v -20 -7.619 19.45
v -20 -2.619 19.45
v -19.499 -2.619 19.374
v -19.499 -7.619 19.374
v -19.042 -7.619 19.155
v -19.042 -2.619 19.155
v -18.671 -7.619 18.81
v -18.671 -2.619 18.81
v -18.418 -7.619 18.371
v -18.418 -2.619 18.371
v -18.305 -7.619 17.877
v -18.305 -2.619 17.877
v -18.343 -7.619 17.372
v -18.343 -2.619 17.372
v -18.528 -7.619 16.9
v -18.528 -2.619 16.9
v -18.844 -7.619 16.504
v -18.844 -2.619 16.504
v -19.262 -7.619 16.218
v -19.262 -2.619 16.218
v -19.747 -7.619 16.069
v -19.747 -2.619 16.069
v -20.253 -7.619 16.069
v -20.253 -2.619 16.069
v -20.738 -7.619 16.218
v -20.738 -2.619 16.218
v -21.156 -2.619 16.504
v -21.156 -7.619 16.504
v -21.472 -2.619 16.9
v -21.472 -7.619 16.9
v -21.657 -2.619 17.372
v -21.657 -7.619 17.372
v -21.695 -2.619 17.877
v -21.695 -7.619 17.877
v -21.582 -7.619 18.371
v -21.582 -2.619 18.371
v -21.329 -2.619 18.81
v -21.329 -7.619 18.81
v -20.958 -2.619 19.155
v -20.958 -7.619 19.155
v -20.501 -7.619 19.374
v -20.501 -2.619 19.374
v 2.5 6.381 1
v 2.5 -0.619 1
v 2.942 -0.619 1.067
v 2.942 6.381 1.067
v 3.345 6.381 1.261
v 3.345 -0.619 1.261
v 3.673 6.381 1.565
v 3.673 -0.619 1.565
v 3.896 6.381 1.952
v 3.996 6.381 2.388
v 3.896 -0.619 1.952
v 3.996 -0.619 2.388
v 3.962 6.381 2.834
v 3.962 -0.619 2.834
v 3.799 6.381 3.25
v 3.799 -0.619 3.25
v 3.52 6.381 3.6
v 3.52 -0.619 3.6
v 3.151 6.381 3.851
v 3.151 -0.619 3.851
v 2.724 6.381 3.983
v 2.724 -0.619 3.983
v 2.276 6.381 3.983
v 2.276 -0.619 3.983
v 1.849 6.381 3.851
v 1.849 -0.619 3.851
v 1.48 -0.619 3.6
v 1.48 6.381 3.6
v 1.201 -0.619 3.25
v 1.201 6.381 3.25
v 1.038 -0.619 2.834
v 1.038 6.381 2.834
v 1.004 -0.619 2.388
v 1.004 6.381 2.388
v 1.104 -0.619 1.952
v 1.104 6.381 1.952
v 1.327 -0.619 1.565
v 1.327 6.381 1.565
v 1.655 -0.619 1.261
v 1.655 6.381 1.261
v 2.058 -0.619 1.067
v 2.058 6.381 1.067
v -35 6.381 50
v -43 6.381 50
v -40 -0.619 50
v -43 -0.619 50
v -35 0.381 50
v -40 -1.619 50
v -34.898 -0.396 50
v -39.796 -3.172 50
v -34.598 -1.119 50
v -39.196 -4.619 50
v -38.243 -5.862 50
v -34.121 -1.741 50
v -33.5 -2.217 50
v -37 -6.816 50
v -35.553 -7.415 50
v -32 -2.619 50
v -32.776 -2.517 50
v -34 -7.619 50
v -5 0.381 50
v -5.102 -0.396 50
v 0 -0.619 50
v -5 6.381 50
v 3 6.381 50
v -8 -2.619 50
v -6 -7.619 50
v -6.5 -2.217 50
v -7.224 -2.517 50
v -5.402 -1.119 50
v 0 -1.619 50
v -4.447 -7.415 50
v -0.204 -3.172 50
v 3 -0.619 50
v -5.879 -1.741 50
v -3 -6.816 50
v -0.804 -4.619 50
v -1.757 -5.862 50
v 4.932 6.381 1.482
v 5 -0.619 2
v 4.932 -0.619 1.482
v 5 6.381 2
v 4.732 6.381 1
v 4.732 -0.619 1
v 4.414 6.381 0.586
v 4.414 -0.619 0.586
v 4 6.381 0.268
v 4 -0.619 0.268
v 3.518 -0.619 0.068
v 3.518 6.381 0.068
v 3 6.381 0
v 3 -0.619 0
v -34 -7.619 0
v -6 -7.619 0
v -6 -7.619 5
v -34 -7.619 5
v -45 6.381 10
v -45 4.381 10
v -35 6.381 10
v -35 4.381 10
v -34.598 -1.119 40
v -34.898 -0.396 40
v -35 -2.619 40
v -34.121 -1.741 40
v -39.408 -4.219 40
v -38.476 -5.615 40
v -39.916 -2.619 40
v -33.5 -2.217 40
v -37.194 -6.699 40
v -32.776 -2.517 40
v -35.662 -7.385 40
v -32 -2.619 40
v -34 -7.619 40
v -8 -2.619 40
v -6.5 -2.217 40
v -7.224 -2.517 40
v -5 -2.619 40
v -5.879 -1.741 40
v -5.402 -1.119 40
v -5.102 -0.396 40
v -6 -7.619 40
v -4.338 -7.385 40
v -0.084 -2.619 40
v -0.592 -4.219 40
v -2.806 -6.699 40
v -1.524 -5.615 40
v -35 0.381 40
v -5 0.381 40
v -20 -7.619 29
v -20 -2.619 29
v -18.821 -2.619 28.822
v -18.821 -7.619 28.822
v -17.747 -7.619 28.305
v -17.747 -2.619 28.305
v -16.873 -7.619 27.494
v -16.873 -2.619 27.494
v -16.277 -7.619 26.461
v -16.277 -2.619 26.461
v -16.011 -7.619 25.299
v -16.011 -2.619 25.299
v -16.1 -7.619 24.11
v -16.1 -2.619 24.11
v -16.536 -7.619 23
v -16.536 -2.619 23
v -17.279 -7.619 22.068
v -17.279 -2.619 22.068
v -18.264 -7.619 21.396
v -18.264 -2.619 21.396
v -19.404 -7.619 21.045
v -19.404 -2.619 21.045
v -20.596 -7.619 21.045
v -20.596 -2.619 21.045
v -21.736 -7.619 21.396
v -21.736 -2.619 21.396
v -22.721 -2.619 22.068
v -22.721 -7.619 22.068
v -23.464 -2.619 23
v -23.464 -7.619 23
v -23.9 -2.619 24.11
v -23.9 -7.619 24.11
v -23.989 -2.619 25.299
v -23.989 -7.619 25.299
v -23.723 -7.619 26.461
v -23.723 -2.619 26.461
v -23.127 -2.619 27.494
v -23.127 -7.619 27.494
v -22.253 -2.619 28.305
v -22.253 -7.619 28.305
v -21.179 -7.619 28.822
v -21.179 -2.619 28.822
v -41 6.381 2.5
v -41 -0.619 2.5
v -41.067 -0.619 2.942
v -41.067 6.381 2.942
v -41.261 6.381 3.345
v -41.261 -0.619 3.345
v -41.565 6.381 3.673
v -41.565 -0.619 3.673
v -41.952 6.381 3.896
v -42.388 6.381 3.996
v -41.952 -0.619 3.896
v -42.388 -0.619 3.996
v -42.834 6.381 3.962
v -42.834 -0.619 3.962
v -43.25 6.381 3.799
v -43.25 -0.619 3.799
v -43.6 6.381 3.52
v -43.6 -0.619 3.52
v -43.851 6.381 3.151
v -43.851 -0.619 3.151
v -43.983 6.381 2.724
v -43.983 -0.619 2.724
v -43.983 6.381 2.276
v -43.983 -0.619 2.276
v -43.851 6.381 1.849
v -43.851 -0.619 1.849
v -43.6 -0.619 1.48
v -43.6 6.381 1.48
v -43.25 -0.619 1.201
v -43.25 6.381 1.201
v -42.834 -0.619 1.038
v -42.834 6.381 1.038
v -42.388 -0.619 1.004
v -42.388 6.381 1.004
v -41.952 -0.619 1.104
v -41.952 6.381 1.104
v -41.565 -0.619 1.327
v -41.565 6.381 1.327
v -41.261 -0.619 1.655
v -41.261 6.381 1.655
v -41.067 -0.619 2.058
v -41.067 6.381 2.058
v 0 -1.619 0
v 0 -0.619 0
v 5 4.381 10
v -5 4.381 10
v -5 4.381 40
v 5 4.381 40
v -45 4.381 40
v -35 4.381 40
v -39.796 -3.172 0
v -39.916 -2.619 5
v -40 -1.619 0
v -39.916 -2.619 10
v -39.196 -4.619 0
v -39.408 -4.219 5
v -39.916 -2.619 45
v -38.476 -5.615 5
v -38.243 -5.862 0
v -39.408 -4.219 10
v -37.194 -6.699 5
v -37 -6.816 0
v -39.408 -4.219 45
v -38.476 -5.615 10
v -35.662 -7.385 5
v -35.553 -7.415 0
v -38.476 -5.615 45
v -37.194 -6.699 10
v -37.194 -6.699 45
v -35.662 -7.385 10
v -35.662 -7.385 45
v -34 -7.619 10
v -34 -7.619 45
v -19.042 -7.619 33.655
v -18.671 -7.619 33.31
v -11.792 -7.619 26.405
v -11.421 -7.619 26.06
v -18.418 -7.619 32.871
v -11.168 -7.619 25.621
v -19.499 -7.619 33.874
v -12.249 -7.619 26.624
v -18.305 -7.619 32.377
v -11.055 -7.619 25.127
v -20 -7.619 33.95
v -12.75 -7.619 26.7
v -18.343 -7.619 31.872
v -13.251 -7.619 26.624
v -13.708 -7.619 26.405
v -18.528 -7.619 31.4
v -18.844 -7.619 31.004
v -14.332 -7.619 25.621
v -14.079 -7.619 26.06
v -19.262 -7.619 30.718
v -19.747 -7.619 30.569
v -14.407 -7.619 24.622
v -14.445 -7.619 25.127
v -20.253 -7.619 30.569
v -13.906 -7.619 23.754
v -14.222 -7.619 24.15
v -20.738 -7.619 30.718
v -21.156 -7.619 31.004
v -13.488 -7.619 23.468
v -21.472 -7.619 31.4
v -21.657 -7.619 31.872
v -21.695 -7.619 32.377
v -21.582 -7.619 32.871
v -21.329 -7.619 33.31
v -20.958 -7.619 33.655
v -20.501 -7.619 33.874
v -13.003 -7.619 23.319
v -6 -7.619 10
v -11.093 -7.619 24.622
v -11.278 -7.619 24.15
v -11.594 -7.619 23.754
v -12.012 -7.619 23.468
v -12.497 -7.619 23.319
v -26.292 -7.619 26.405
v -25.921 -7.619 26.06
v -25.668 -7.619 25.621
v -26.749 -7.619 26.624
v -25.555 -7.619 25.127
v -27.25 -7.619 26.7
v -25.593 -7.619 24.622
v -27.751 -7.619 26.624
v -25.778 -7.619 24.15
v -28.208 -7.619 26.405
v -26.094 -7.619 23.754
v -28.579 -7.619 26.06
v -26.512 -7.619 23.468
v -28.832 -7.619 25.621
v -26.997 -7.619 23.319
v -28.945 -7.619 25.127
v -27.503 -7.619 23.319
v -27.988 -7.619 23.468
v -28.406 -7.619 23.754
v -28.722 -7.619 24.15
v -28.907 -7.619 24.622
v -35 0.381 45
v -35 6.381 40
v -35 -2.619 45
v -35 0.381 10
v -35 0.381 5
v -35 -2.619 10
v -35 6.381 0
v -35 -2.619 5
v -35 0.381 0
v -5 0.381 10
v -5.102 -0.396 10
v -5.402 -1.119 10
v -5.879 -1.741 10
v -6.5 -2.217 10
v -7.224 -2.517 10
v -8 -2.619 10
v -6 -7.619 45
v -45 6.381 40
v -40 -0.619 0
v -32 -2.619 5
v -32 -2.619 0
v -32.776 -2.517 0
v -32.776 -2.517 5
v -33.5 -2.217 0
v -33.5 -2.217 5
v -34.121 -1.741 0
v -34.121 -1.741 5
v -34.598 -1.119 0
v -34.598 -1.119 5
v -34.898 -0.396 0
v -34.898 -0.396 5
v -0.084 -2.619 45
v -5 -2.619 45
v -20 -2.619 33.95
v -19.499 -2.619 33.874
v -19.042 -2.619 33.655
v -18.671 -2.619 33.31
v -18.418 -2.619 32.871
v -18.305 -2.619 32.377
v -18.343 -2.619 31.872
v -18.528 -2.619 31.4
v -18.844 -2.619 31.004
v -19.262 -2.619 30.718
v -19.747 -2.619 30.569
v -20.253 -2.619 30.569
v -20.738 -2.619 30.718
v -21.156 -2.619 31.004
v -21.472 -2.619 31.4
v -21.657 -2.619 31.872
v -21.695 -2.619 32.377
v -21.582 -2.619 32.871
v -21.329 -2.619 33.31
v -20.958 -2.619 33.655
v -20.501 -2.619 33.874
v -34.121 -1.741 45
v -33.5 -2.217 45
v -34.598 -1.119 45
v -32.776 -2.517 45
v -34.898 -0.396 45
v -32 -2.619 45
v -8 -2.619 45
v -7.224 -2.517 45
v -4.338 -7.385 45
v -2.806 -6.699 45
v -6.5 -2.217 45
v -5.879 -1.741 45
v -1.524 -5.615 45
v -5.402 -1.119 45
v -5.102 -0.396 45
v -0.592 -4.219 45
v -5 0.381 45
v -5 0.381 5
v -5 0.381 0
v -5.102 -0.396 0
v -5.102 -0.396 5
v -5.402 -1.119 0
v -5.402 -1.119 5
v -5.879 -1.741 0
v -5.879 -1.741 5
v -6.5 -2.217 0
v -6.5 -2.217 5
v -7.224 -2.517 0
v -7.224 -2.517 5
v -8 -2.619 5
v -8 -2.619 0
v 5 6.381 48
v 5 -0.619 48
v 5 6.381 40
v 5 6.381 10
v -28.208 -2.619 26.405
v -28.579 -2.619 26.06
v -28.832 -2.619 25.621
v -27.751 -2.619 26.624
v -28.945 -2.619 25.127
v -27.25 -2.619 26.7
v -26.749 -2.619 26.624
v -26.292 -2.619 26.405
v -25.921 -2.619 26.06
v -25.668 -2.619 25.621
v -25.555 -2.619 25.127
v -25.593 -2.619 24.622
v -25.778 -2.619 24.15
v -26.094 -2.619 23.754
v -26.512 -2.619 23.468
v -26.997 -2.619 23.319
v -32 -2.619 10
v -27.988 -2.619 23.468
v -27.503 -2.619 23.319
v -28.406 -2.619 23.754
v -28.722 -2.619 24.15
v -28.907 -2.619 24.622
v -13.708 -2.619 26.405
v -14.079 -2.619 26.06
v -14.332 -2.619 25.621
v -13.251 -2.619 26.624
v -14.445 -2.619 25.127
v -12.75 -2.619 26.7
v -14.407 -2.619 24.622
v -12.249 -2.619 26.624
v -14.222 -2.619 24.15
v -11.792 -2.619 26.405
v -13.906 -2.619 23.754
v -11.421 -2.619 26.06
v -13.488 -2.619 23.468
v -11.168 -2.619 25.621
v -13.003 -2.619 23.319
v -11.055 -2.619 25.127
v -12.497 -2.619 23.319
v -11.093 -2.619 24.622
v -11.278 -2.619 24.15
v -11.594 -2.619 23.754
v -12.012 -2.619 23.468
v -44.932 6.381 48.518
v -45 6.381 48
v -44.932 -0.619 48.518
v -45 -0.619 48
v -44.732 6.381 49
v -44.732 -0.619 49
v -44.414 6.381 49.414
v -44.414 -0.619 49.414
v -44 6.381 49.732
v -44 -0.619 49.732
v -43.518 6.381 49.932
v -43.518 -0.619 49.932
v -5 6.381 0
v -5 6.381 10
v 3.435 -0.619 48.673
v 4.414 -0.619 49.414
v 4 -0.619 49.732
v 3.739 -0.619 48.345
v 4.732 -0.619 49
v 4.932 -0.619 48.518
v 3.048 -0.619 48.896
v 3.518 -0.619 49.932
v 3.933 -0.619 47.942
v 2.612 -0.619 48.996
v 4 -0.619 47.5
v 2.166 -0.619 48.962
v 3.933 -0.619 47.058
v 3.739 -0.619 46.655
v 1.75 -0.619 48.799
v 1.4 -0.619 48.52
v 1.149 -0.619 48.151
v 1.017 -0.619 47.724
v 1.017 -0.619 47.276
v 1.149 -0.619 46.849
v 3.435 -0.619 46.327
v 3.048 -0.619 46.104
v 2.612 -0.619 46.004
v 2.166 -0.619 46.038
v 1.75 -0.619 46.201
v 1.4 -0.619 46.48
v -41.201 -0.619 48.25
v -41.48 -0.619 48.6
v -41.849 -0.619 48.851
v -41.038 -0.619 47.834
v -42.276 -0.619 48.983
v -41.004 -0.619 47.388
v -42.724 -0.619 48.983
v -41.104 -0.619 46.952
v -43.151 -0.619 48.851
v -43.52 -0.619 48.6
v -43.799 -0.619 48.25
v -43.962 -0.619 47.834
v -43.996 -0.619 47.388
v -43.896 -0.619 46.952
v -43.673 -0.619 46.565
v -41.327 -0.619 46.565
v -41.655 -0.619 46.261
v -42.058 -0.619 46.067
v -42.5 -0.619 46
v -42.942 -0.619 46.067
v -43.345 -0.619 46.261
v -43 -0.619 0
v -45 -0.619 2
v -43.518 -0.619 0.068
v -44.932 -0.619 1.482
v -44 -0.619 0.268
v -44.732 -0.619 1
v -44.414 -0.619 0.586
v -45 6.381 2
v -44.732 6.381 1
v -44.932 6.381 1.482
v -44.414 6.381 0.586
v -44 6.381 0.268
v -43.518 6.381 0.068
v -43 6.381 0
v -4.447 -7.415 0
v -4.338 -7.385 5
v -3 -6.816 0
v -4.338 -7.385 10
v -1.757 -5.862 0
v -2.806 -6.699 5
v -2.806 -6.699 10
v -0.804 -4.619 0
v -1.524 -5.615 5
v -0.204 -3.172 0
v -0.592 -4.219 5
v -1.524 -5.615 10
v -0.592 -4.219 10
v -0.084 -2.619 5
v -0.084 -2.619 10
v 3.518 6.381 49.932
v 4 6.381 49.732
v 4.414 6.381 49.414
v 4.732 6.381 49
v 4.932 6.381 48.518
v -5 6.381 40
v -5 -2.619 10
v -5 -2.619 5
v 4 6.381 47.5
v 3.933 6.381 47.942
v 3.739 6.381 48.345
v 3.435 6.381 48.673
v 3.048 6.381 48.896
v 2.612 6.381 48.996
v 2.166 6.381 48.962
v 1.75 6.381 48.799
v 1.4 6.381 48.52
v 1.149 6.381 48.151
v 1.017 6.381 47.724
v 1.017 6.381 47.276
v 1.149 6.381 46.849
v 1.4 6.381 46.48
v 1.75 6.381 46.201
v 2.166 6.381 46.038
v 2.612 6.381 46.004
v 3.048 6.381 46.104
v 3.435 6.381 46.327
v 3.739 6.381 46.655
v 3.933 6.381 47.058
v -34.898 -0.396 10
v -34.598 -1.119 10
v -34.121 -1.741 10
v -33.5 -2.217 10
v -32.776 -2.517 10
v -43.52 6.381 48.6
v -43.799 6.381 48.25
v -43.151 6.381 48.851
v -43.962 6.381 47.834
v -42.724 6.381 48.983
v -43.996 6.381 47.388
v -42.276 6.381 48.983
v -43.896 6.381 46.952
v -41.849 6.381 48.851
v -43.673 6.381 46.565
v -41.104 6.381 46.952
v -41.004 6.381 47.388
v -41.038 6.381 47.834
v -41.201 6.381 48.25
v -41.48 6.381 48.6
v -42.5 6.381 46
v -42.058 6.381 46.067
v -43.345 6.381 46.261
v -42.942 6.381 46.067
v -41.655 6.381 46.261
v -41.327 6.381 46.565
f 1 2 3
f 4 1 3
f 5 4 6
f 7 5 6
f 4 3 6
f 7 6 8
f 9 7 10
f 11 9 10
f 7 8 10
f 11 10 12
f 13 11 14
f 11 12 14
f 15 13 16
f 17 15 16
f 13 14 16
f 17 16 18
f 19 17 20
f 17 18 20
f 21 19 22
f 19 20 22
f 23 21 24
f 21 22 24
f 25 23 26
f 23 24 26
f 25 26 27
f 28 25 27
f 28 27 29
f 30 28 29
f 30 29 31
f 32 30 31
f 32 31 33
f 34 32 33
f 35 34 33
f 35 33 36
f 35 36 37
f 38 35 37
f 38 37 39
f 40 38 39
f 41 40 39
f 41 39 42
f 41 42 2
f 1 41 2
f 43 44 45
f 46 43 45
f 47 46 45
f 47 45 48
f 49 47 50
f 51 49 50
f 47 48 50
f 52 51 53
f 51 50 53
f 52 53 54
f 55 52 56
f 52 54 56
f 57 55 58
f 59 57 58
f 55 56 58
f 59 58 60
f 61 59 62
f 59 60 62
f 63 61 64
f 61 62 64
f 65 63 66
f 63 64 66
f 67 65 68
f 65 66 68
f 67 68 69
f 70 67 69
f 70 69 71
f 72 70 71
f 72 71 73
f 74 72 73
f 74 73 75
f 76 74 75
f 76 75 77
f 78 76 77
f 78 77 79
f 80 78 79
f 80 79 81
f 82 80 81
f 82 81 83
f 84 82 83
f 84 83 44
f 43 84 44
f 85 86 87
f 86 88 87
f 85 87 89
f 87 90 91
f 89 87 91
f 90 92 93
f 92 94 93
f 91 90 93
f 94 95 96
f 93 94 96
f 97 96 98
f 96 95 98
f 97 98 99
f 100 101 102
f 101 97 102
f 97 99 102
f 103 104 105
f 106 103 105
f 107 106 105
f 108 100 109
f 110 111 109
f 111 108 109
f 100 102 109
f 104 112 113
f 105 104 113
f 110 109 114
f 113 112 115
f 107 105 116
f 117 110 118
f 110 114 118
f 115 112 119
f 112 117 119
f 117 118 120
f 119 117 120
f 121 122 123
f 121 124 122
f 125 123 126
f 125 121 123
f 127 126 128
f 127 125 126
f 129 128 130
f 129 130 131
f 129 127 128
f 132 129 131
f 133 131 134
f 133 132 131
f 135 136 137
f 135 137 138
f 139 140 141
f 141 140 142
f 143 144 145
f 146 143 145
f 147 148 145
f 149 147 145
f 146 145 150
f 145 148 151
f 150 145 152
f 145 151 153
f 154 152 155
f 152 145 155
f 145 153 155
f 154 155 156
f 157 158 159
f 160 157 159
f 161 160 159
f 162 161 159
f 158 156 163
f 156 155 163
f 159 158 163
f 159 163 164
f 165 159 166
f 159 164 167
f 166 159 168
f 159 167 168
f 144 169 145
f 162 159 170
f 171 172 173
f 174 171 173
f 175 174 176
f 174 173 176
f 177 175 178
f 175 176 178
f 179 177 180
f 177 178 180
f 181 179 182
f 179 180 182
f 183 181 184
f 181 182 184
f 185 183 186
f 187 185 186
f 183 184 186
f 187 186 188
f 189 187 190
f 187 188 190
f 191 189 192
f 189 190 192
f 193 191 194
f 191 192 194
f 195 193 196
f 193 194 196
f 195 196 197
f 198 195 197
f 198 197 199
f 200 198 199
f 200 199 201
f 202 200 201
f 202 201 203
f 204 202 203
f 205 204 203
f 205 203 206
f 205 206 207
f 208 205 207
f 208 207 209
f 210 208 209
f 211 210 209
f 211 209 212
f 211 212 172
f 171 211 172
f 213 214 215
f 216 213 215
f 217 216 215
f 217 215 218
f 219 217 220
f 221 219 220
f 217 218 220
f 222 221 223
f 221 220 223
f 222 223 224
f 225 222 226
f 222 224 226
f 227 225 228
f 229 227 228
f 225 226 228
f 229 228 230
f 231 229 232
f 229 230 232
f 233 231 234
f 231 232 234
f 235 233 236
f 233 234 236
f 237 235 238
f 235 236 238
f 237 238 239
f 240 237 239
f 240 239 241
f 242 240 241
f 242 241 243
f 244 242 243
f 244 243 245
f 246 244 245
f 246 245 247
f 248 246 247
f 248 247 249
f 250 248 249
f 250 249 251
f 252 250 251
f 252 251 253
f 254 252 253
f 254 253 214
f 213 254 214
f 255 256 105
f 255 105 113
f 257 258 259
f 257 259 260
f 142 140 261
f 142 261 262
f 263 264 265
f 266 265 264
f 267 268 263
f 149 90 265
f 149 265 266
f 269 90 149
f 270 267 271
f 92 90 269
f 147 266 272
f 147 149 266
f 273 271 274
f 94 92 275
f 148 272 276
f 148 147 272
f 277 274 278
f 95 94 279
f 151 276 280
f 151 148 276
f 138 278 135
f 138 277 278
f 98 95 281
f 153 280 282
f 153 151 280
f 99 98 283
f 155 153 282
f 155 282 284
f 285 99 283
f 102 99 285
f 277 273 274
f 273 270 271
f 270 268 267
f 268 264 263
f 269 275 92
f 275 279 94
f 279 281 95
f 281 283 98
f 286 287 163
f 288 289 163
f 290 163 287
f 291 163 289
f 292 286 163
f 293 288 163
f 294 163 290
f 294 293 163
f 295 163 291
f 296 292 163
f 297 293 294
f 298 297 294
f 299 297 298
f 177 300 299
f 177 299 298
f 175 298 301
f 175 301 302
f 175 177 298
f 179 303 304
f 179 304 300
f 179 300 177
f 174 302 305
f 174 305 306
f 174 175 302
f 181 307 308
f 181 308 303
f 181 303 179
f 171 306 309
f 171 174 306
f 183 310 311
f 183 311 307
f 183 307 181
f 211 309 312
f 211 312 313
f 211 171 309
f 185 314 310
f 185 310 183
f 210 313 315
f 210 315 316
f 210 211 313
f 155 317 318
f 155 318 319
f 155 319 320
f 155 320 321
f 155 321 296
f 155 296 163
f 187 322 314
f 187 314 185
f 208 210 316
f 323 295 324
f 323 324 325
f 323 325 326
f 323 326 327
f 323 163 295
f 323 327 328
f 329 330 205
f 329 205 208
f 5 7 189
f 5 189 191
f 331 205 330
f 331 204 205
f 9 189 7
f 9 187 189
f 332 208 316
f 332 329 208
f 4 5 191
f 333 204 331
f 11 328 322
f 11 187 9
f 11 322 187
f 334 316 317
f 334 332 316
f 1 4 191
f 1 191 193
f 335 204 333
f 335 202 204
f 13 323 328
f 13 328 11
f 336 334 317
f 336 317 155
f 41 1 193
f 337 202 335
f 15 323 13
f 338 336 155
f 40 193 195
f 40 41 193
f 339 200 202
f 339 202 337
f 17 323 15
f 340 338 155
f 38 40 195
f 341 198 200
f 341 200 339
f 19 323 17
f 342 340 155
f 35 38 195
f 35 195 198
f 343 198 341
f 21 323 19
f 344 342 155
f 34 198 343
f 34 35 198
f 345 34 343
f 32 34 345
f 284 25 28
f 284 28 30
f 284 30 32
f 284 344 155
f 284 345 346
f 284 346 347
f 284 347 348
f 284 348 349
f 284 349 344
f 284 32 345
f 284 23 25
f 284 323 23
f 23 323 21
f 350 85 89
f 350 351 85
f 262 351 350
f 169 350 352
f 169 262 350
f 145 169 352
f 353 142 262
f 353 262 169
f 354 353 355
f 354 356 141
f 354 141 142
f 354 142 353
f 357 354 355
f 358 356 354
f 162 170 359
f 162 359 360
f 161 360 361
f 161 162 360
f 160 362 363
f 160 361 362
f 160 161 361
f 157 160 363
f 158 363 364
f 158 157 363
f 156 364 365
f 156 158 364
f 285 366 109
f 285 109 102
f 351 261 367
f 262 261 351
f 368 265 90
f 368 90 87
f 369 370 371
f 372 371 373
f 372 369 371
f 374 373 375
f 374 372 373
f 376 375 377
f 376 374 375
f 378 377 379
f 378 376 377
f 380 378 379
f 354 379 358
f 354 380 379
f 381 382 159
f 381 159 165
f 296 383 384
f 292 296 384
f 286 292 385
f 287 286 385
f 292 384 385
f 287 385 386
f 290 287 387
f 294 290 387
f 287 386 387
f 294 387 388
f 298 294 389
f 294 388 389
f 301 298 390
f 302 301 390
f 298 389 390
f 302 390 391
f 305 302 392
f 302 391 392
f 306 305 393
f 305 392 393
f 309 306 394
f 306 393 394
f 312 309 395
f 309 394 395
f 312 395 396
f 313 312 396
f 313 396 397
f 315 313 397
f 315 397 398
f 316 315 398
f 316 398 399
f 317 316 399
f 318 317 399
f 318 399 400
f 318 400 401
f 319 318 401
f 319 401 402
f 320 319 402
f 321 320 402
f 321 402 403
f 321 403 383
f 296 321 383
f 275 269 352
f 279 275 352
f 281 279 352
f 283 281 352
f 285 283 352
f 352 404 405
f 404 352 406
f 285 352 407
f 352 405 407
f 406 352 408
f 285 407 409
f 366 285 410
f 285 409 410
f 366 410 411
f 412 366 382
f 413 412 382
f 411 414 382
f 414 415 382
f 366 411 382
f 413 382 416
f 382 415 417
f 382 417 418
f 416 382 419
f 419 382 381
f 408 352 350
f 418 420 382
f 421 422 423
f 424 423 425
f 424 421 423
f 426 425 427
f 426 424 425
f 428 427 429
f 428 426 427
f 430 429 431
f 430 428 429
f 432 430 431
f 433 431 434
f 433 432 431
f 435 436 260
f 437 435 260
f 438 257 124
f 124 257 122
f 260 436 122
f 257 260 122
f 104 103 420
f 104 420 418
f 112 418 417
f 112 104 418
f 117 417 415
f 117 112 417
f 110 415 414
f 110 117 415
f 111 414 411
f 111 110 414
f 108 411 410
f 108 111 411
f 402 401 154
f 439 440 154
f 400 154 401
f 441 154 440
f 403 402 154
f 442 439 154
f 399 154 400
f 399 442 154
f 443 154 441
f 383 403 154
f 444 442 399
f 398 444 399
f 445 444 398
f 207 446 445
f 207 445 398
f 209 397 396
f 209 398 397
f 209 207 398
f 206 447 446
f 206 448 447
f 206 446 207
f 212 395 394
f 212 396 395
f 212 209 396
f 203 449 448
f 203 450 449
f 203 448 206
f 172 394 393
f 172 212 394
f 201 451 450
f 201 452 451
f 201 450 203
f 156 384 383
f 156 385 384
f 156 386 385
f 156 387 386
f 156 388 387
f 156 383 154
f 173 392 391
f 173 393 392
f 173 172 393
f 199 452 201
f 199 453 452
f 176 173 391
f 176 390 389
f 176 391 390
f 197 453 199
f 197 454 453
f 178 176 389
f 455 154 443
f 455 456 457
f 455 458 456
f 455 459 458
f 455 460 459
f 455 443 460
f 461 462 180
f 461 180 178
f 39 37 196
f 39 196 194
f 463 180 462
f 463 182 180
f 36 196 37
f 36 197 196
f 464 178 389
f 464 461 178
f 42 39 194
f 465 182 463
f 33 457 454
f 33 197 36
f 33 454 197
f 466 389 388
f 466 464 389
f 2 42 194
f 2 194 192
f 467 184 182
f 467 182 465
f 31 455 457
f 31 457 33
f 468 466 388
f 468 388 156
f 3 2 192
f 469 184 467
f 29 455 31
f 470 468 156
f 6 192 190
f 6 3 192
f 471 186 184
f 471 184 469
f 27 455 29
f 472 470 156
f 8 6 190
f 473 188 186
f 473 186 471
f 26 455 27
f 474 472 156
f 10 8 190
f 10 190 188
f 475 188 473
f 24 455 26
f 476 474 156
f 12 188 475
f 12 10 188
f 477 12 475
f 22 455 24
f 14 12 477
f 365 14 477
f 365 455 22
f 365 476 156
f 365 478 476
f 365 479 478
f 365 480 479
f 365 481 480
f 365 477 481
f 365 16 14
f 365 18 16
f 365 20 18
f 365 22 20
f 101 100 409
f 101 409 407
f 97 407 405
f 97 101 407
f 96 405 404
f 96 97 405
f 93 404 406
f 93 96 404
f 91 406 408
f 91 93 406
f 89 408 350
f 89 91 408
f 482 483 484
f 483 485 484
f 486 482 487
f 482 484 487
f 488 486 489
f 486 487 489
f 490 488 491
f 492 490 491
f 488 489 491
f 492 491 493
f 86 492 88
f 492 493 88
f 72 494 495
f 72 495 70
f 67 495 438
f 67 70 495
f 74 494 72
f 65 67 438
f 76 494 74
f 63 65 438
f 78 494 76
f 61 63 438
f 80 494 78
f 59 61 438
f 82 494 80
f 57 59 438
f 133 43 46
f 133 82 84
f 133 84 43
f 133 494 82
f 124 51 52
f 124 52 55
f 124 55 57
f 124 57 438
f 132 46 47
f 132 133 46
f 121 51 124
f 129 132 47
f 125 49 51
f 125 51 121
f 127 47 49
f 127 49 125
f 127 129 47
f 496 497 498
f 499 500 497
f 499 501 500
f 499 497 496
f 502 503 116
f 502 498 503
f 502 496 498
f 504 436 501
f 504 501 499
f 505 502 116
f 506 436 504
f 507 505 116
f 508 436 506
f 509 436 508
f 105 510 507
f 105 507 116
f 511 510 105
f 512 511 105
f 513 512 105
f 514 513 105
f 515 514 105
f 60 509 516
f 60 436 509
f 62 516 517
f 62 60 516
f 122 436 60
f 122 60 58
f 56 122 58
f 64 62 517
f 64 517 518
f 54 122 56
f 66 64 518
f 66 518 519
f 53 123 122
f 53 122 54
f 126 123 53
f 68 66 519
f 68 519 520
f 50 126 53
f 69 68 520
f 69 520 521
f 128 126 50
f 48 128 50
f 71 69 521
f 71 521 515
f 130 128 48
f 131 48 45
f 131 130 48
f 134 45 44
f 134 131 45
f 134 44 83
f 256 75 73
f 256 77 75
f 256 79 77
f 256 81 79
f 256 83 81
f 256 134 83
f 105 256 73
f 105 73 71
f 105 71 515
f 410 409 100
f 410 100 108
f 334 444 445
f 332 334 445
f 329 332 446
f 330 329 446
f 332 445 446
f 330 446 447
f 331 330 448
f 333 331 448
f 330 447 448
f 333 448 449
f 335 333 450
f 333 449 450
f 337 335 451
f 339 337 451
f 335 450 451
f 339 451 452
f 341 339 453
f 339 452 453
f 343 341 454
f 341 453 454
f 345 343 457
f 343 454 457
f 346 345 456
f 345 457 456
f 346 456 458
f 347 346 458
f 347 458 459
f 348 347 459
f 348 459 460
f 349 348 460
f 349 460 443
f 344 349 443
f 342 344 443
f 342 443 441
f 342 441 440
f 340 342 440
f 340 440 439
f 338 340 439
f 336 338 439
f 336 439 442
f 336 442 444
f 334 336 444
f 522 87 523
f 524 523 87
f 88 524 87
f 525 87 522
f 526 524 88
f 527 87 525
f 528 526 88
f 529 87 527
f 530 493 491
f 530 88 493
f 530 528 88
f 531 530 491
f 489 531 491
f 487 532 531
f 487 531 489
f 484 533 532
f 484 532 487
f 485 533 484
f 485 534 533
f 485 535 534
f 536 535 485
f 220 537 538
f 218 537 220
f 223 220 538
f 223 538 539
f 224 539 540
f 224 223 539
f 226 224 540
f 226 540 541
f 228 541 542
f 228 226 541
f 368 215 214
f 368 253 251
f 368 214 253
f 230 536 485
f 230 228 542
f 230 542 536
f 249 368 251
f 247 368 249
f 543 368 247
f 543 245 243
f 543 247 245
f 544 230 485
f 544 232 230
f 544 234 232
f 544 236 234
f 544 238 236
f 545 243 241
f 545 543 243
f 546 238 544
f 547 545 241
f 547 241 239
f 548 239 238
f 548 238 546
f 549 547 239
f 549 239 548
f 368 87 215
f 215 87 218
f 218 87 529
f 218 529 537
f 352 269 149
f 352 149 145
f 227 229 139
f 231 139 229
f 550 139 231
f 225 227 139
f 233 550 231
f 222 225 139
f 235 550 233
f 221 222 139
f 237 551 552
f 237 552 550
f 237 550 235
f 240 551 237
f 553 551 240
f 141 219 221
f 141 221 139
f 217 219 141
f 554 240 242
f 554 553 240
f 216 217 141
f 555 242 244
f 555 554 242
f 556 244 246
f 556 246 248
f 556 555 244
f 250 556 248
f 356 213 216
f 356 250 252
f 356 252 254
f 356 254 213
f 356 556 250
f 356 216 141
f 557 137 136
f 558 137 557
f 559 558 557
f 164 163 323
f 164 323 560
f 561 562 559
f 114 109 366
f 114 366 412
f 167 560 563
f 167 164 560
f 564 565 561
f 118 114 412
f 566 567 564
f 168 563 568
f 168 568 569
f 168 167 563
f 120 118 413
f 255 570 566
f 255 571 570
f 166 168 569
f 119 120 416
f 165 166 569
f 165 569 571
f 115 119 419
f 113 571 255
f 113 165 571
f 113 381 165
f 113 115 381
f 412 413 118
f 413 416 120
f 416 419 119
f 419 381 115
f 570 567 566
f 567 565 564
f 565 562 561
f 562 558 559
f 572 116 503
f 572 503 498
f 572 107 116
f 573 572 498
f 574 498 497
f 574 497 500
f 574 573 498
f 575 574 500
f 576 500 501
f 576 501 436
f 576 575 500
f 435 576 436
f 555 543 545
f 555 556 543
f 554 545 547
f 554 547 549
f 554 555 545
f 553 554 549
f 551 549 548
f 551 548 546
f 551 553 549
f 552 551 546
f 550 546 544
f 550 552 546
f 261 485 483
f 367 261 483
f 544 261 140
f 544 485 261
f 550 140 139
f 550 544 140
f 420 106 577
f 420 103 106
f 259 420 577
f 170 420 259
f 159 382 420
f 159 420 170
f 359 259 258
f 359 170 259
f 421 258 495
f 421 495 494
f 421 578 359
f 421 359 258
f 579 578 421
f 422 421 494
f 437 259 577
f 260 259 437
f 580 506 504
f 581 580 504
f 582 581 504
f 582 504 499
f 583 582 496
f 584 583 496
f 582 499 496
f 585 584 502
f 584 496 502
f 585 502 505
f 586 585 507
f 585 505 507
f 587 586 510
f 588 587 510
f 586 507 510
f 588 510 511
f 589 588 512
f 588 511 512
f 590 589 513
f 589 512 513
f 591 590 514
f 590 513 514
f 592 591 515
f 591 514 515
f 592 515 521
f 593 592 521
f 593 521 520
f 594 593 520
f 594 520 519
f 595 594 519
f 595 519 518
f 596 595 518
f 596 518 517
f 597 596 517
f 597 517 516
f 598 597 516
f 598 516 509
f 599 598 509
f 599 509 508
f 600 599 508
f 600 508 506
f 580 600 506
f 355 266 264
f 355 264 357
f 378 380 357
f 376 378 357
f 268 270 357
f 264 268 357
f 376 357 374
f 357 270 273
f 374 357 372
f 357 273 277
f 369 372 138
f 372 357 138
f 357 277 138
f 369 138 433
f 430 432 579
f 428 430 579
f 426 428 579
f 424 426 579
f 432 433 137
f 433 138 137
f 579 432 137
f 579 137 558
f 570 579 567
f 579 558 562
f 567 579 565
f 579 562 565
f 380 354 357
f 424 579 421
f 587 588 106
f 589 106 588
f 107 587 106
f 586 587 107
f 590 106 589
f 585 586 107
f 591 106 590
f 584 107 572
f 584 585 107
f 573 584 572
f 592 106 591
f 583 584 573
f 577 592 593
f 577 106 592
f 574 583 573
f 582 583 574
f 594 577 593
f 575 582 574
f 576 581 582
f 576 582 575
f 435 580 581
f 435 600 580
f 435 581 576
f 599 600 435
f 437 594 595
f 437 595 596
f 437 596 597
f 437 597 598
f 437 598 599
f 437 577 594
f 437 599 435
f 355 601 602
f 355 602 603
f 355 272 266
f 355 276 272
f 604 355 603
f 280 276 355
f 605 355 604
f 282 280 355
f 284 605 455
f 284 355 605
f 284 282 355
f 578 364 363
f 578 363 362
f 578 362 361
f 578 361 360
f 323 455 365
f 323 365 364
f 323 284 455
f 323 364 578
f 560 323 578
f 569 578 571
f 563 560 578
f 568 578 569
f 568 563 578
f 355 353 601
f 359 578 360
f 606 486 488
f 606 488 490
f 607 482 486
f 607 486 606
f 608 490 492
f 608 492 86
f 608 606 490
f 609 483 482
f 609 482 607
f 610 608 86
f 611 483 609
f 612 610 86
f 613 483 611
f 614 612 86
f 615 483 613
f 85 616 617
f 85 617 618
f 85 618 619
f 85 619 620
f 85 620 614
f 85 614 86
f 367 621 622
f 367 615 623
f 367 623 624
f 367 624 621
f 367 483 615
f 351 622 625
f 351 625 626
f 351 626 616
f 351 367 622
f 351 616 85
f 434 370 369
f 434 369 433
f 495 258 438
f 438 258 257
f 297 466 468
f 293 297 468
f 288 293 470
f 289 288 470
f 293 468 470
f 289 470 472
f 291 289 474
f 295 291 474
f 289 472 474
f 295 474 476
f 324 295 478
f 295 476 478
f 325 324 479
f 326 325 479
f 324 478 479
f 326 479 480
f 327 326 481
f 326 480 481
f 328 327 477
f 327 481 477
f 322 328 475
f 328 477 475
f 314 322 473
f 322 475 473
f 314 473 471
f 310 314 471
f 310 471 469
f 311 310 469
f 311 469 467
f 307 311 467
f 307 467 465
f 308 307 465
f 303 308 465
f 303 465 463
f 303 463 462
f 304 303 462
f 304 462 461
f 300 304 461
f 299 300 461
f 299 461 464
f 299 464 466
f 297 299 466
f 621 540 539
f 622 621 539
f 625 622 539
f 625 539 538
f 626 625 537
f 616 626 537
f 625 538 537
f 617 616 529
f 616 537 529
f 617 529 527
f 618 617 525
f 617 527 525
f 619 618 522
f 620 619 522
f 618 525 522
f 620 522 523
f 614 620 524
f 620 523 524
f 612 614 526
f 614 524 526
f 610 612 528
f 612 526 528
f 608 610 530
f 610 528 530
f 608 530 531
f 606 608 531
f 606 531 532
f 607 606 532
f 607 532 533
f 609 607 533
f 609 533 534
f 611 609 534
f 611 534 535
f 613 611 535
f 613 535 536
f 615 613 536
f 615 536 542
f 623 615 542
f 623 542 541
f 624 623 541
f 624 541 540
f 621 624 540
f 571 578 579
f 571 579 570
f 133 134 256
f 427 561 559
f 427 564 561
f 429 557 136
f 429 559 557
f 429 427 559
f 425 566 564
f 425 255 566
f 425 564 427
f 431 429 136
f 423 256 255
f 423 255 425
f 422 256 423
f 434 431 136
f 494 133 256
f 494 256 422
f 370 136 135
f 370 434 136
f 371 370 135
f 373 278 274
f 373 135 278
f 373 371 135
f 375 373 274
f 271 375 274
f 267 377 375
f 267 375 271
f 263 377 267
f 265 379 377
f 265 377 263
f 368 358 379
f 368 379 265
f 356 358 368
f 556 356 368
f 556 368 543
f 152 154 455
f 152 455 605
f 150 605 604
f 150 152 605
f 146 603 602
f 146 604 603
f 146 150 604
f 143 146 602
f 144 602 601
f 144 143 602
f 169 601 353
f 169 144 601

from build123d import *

# Parameters (mm, degrees)
EXTRUDE_1_DEPTH     = 50
SKETCH_2_R          = 4
SKETCH_2_R_2        = 1.7
CUT_EXTRUDE_1_DEPTH = 50
SKETCH_3_W          = 10
SKETCH_3_H          = 10
EXTRUDE_2_DEPTH     = 2
FILLET_1_R          = 6
FILLET_2_R          = 6
FILLET_3_R          = 3
FILLET_4_R          = 3
SKETCH_5_R          = 1.5
CUT_EXTRUDE_2_DEPTH = 23
FILLET_5_R          = 2
FILLET_6_R          = 2
FILLET_7_R          = 2
FILLET_8_R          = 2
SKETCH_7_W          = 44.35766487
SKETCH_7_H          = 5
CUT_EXTRUDE_4_DEPTH = 5
CUT_EXTRUDE_5_DEPTH = 31


with BuildPart() as part:
    # 草图1 → 凸台-拉伸1 (new body)
    with BuildSketch(Plane.XY):
        Polygon((-45, 4.380640832), (-35, 4.380640832), (-35, -2.619359168), (-5, -2.619359168), (-5, 4.380640832), (5, 4.380640832), (5, -0.619359168), (0, -0.619359168), (0, -7.619359168), (-40, -7.619359168), (-40, -0.619359168), (-45, -0.619359168), align=None)
    extrude(amount=EXTRUDE_1_DEPTH)

    # 草图2 → 切除-拉伸1 (cut)
    with BuildSketch(Plane(origin=(0, -2.619359168, 0), x_dir=(1, 0, 0), z_dir=(0, 1, 0))):
        with Locations(Location((-20, -25, 0), (0, 0, 270))):
            Circle(SKETCH_2_R)
        with Locations(Location((-20, -17.75, 0), (0, 0, 270))):
            Circle(SKETCH_2_R_2)
        with Locations(Location((-12.75, -25, 0), (0, 0, 270))):
            Circle(SKETCH_2_R_2)
        with Locations(Location((-20, -32.25, 0), (0, 0, 270))):
            Circle(SKETCH_2_R_2)
        with Locations(Location((-27.25, -25, 0), (0, 0, 270))):
            Circle(SKETCH_2_R_2)
    extrude(amount=-CUT_EXTRUDE_1_DEPTH, mode=Mode.SUBTRACT)

    # 草图3 → 凸台-拉伸2 (add)
    with BuildSketch(Plane(origin=(0, 4.380640832, 0), x_dir=(1, 0, 0), z_dir=(0, 1, 0))):
        with Locations((0, -45)):
            Rectangle(SKETCH_3_W, SKETCH_3_H)
        with Locations((-40, -45)):
            Rectangle(SKETCH_3_W, SKETCH_3_H)
        with Locations((-40, -5)):
            Rectangle(SKETCH_3_W, SKETCH_3_H)
        with Locations((0, -5)):
            Rectangle(SKETCH_3_W, SKETCH_3_H)
    extrude(amount=EXTRUDE_2_DEPTH)

    # 圆角1
    fillet_1_edges = [part.edges().sort_by_distance(p)[0] for p in [
        (-40, -7.619359168, 25),
    ]]
    fillet(fillet_1_edges, radius=FILLET_1_R)

    # 圆角2
    fillet_2_edges = [part.edges().sort_by_distance(p)[0] for p in [
        (0, -7.619359168, 25),
    ]]
    fillet(fillet_2_edges, radius=FILLET_2_R)

    # 圆角3
    fillet_3_edges = [part.edges().sort_by_distance(p)[0] for p in [
        (-5, -2.619359168, 25),
    ]]
    fillet(fillet_3_edges, radius=FILLET_3_R)

    # 圆角4
    fillet_4_edges = [part.edges().sort_by_distance(p)[0] for p in [
        (-35, -2.619359168, 25),
    ]]
    fillet(fillet_4_edges, radius=FILLET_4_R)

    # 草图5 → 切除-拉伸2 (cut)
    with BuildSketch(Plane.XZ.offset(0.619359168)):
        with Locations((2.5, 47.5)):
            Circle(SKETCH_5_R)
        with Locations(Location((2.5, 2.5, 0), (0, 0, 270))):
            Circle(SKETCH_5_R)
        with Locations((-42.5, 2.5)):
            Circle(SKETCH_5_R)
        with Locations(Location((-42.5, 47.5, 0), (0, 0, 270))):
            Circle(SKETCH_5_R)
    extrude(amount=-CUT_EXTRUDE_2_DEPTH, mode=Mode.SUBTRACT)

    # 圆角5
    fillet_5_edges = [part.edges().sort_by_distance(p)[0] for p in [
        (5, 2.880640832, 50),
    ]]
    fillet(fillet_5_edges, radius=FILLET_5_R)

    # 圆角6
    fillet_6_edges = [part.edges().sort_by_distance(p)[0] for p in [
        (5, 2.880640832, 0),
    ]]
    fillet(fillet_6_edges, radius=FILLET_6_R)

    # 圆角7
    fillet_7_edges = [part.edges().sort_by_distance(p)[0] for p in [
        (-45, 2.880640832, 0),
    ]]
    fillet(fillet_7_edges, radius=FILLET_7_R)

    # 圆角8
    fillet_8_edges = [part.edges().sort_by_distance(p)[0] for p in [
        (-45, 2.880640832, 50),
    ]]
    fillet(fillet_8_edges, radius=FILLET_8_R)

    # 草图7 → 切除-拉伸4 (cut)
    with BuildSketch(Plane.XZ.offset(7.619359168)):
        with Locations((-20.290282059, 42.5)):
            Rectangle(SKETCH_7_W, SKETCH_7_H)
        with Locations((-20.290282059, 7.5)):
            Rectangle(SKETCH_7_W, SKETCH_7_H)
    extrude(amount=-CUT_EXTRUDE_4_DEPTH, mode=Mode.SUBTRACT)

    # 草图8 → 切除-拉伸5 (cut)
    with BuildSketch(Plane(origin=(0, 6.380640832, 0), x_dir=(1, 0, 0), z_dir=(0, 1, 0))):
        Polygon((-5, -40), (-8, -40), (-35, -40), (-35, -45), (-5, -45), align=None)
        Polygon((-35, -10), (-8, -10), (-5, -10), (-5, -5), (-35, -5), align=None)
    extrude(amount=-CUT_EXTRUDE_5_DEPTH, mode=Mode.SUBTRACT)


solid = part.part
